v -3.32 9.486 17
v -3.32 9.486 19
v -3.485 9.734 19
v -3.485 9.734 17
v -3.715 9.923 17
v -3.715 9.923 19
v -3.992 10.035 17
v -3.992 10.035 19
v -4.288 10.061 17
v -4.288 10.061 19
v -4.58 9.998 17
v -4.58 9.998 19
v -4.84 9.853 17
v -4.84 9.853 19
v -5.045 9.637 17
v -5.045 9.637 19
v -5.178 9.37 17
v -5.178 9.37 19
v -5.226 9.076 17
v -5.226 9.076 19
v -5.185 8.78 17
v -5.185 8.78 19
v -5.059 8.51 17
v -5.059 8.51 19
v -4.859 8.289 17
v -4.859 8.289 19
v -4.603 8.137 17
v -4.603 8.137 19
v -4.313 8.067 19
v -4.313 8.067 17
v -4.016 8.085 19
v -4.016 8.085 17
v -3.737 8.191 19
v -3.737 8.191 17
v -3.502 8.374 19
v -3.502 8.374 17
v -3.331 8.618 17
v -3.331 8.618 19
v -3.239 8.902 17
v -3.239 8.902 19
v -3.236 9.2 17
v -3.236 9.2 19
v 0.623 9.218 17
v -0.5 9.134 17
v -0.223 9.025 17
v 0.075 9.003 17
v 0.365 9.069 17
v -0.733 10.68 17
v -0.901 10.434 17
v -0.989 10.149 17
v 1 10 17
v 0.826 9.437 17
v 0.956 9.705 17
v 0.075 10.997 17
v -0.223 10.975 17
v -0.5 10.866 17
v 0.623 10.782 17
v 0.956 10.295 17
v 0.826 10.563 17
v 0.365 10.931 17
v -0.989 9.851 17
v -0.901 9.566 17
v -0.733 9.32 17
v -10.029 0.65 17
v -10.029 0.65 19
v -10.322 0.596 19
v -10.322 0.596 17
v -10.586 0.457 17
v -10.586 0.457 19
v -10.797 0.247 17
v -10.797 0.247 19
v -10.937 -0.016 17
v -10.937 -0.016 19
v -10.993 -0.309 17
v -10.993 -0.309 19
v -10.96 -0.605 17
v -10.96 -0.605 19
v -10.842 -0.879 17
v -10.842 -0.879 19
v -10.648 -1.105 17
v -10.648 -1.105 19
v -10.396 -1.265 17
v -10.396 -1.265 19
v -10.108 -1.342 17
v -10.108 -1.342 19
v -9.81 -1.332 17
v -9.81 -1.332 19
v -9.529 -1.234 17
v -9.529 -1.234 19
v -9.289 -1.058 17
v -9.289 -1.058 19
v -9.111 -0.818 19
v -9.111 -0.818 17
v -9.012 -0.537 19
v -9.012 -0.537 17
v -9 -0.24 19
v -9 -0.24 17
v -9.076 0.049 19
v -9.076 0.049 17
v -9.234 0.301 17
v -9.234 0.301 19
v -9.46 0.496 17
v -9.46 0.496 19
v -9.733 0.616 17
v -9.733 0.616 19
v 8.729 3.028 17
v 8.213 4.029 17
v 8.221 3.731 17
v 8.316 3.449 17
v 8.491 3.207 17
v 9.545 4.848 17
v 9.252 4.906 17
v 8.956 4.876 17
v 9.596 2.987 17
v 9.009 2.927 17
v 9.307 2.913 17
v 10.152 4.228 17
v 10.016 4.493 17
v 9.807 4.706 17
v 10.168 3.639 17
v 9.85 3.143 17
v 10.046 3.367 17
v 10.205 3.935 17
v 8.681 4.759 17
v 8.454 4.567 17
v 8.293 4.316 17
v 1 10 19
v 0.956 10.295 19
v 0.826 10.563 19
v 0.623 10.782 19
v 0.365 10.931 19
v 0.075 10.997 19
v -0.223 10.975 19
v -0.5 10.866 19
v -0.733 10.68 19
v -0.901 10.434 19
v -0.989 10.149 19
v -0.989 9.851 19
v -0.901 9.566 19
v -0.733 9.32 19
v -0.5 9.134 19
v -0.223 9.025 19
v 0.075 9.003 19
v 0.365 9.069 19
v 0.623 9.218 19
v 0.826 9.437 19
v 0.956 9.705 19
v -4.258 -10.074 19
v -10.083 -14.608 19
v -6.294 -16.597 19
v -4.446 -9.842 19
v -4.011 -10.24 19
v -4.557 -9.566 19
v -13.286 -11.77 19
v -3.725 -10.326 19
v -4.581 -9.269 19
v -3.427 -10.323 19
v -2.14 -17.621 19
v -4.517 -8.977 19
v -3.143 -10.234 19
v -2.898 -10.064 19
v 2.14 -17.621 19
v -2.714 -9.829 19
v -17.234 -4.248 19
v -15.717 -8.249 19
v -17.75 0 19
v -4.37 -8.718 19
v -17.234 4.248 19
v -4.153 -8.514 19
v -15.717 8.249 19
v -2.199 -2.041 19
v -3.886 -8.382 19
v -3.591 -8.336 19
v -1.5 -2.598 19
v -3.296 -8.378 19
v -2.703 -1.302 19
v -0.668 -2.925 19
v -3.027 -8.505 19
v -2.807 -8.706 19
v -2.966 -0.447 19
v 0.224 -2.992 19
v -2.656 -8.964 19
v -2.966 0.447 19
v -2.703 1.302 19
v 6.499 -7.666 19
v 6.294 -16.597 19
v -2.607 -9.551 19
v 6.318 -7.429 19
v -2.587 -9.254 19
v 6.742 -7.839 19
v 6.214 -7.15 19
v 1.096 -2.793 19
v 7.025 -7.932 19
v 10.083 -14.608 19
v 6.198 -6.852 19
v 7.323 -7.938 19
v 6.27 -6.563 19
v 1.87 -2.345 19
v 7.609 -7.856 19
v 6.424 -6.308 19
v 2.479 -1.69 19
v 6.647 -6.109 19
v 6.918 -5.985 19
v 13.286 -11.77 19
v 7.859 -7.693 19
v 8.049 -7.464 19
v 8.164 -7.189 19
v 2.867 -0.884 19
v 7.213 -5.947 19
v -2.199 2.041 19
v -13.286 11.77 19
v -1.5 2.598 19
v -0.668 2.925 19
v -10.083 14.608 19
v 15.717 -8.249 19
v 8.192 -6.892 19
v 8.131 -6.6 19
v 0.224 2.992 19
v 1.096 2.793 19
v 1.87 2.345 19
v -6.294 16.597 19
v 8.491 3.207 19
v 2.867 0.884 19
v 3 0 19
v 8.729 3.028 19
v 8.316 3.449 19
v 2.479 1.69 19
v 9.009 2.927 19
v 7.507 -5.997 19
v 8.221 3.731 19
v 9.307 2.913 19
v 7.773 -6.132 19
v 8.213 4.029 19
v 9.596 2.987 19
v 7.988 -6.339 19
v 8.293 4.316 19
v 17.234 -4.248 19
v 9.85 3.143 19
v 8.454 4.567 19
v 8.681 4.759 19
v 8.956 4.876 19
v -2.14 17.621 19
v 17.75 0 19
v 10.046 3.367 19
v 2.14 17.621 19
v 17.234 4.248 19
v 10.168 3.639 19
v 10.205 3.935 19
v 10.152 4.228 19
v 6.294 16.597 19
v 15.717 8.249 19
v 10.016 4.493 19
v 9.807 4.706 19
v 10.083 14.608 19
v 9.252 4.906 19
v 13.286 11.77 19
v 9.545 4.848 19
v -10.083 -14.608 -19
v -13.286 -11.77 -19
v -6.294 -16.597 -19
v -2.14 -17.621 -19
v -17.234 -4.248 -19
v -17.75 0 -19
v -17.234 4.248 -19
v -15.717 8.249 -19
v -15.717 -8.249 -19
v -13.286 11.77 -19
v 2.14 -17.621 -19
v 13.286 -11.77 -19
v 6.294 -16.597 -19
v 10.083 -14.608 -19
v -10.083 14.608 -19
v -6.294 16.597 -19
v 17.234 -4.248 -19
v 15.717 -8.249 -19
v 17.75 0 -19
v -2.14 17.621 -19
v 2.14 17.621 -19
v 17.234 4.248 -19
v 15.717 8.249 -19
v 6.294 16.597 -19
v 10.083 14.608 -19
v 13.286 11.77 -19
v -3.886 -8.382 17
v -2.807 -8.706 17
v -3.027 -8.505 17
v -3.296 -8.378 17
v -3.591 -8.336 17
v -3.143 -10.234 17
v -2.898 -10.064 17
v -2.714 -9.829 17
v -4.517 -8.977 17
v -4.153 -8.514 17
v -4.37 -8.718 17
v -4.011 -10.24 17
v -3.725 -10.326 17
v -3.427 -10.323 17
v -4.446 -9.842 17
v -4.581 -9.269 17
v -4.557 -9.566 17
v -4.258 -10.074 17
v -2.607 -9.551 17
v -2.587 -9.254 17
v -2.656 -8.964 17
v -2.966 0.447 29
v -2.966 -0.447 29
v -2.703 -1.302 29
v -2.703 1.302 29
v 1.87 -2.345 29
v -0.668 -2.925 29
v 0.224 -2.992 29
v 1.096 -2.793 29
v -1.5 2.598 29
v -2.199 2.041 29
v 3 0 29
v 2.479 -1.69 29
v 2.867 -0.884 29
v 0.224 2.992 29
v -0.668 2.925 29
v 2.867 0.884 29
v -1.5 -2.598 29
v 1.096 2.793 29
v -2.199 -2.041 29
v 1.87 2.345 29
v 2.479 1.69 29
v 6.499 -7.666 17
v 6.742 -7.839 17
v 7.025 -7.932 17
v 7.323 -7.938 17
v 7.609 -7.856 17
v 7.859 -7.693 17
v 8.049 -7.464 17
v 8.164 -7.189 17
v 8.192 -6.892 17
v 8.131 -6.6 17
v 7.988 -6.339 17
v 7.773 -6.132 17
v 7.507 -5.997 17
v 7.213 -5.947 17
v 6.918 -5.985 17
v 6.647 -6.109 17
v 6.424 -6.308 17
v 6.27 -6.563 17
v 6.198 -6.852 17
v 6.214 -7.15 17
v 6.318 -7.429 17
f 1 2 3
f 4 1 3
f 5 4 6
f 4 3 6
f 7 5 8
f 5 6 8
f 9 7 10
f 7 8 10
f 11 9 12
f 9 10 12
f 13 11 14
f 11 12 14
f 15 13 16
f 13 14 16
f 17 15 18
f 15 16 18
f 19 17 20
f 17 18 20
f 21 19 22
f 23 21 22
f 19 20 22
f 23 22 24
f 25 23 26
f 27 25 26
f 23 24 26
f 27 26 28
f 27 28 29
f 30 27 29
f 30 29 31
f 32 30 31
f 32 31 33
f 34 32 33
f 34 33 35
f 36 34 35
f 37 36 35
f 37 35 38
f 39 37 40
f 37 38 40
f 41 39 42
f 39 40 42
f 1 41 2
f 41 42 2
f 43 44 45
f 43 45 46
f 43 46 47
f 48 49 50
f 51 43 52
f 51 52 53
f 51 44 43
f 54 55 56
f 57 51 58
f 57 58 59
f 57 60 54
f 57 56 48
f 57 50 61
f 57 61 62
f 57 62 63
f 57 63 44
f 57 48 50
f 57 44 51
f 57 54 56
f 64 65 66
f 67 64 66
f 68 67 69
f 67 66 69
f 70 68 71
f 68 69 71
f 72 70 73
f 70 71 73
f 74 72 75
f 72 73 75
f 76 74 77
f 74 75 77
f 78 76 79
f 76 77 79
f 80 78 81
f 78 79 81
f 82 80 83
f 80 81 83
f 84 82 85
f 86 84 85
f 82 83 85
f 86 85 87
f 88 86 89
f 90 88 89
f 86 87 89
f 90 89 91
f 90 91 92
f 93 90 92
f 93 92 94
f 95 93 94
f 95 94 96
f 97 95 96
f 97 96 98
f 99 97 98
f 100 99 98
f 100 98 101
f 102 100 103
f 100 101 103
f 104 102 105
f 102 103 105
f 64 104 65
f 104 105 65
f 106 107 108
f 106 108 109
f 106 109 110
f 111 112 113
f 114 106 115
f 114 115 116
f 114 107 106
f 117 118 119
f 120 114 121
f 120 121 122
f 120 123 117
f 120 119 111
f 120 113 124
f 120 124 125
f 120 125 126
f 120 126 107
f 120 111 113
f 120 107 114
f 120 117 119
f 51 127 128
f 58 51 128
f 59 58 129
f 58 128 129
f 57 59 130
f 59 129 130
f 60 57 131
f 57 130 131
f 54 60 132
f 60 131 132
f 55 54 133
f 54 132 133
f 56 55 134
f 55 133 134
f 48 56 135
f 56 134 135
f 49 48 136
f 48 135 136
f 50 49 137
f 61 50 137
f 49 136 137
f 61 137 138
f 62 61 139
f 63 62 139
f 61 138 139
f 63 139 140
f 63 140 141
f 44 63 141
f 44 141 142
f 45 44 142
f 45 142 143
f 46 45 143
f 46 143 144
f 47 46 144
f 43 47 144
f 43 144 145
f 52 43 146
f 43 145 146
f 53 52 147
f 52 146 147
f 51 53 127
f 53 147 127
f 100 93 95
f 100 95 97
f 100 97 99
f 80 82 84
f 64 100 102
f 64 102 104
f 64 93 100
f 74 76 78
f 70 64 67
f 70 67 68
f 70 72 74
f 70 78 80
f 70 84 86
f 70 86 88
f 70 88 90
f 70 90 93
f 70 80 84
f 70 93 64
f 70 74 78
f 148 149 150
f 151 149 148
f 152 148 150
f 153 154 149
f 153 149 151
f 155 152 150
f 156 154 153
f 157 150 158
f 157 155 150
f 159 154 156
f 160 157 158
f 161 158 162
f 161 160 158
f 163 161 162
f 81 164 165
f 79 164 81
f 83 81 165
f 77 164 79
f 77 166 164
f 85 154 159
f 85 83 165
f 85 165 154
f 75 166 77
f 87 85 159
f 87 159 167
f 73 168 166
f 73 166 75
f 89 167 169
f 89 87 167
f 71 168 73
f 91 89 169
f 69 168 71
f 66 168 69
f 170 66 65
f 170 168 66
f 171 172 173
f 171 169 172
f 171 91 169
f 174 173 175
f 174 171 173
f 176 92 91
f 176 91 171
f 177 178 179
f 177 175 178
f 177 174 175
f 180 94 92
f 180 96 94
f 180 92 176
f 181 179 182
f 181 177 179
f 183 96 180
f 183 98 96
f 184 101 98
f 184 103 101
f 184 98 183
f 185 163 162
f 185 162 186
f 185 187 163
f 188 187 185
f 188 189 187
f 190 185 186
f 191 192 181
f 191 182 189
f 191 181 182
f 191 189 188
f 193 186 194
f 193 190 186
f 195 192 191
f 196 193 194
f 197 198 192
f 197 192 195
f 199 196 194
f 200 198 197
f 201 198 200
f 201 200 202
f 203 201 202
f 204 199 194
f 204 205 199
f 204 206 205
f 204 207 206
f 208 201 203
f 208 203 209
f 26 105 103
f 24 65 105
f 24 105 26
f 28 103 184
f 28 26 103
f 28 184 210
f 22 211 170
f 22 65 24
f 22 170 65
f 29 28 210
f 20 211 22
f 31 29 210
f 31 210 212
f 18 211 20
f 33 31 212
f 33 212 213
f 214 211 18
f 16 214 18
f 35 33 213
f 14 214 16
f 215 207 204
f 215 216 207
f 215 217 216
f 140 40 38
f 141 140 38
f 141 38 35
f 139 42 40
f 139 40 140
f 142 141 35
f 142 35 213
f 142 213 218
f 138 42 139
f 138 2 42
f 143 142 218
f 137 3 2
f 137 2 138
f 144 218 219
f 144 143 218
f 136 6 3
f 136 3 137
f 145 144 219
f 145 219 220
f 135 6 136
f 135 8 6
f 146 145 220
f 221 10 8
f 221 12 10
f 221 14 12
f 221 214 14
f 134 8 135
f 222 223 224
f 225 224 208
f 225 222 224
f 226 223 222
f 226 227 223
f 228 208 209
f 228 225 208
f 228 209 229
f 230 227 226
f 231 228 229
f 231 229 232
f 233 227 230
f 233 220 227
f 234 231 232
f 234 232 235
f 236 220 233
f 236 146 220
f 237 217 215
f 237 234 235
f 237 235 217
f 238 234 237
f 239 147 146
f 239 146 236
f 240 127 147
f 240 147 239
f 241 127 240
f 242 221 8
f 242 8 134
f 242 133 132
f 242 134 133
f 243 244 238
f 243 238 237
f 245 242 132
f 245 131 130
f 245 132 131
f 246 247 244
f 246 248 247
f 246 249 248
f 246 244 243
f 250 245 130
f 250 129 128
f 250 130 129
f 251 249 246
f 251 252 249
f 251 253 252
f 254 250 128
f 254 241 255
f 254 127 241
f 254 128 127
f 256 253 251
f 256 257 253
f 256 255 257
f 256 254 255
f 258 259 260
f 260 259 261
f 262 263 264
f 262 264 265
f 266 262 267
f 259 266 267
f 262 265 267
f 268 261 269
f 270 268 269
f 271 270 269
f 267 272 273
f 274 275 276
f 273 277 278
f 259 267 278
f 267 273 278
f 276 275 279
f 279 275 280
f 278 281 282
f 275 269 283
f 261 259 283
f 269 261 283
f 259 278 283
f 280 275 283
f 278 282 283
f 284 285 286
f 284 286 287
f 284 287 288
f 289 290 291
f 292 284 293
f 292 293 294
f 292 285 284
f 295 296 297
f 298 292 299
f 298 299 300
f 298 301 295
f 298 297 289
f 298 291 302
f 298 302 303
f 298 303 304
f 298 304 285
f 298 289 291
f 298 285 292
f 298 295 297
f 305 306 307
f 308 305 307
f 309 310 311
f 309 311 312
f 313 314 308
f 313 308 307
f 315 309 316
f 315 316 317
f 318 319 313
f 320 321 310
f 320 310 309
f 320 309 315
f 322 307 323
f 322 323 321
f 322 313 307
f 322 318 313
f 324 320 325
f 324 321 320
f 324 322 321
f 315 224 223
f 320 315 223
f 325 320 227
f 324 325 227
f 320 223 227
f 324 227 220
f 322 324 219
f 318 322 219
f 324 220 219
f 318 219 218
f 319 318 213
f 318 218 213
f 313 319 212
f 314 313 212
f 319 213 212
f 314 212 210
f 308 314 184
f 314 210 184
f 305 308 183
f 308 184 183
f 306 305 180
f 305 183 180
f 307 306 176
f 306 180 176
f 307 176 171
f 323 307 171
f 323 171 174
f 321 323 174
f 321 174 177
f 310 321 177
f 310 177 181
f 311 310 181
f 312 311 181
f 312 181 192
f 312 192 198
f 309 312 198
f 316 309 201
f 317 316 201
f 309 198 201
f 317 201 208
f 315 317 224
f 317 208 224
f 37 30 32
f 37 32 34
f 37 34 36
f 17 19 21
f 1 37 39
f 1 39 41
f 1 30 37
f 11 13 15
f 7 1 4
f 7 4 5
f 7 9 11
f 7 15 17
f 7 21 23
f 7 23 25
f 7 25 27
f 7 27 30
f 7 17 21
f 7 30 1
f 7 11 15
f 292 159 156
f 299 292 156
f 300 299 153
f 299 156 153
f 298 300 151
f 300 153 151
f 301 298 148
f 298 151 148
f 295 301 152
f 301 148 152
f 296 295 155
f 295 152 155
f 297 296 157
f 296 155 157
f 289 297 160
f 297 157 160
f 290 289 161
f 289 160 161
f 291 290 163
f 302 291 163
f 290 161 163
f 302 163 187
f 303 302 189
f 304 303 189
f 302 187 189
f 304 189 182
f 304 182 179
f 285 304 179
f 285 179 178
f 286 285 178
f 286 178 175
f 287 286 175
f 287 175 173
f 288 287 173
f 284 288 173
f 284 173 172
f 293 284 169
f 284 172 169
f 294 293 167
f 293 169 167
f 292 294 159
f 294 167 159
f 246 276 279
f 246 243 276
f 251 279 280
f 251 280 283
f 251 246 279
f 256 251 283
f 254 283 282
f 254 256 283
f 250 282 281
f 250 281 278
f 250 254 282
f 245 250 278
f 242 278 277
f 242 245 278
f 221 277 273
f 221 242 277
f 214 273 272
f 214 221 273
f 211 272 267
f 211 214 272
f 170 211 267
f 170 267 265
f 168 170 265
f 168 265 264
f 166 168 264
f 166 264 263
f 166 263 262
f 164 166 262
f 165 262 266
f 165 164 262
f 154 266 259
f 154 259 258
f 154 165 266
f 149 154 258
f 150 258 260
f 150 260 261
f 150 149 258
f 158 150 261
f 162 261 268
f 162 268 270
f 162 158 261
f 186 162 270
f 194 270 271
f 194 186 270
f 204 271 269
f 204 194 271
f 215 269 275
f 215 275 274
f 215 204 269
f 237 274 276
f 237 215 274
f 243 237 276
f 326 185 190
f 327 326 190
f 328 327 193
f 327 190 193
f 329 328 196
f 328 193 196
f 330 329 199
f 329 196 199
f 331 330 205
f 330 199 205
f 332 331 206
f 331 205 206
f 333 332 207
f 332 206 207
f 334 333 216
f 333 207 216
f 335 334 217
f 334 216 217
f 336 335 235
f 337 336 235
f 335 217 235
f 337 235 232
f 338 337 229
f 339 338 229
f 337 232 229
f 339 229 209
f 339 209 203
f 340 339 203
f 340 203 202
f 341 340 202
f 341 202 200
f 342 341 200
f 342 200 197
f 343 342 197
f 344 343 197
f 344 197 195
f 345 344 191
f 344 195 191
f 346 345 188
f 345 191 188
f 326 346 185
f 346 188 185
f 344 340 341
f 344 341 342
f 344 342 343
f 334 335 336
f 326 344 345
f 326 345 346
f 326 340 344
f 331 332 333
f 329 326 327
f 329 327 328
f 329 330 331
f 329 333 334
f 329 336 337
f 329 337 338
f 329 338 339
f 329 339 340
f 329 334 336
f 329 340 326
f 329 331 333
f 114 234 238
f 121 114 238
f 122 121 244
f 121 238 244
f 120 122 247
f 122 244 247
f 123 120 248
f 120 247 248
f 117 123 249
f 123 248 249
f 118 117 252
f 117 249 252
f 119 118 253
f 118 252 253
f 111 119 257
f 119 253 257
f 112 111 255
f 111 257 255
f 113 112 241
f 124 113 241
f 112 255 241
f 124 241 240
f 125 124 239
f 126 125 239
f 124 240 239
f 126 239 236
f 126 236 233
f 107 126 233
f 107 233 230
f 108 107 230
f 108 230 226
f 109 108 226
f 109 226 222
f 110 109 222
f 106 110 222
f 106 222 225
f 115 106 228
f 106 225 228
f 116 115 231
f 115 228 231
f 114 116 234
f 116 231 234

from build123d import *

# Parameters (mm, degrees)
SKETCH1_R           = 17.75
BOSS_EXTRUDE1_DEPTH = 19
SKETCH2_R           = 3
BOSS_EXTRUDE2_DEPTH = 10
SKETCH3_R           = 1
CUT_EXTRUDE1_DEPTH  = 2
CIRPATTERN1_COUNT   = 6
CIRPATTERN1_ANGLE   = 335


with BuildPart() as part:
    # Sketch1 → Boss-Extrude1 (new body, symmetric)
    with BuildSketch(Plane.XY):
        Circle(SKETCH1_R)
    extrude(amount=BOSS_EXTRUDE1_DEPTH, both=True)

    # Sketch2 → Boss-Extrude2 (add)
    with BuildSketch(Plane.XY.offset(19)):
        Circle(SKETCH2_R)
    extrude(amount=BOSS_EXTRUDE2_DEPTH)

    # Sketch3 → Cut-Extrude1 (cut)
    with BuildSketch(Plane.XY.offset(19)):
        with Locations((0, 10)):
            Circle(SKETCH3_R)
    cut_extrude1 = extrude(amount=-CUT_EXTRUDE1_DEPTH, mode=Mode.SUBTRACT)

    # CirPattern1: Cut-Extrude1 ×6 about axis
    cirpattern1_axis = Axis((0, 0, 0), (0, 0, -1))
    for i in range(1, CIRPATTERN1_COUNT):
        add(cut_extrude1.rotate(cirpattern1_axis, i * CIRPATTERN1_ANGLE / (CIRPATTERN1_COUNT - 1)), mode=Mode.SUBTRACT)


solid = part.part
